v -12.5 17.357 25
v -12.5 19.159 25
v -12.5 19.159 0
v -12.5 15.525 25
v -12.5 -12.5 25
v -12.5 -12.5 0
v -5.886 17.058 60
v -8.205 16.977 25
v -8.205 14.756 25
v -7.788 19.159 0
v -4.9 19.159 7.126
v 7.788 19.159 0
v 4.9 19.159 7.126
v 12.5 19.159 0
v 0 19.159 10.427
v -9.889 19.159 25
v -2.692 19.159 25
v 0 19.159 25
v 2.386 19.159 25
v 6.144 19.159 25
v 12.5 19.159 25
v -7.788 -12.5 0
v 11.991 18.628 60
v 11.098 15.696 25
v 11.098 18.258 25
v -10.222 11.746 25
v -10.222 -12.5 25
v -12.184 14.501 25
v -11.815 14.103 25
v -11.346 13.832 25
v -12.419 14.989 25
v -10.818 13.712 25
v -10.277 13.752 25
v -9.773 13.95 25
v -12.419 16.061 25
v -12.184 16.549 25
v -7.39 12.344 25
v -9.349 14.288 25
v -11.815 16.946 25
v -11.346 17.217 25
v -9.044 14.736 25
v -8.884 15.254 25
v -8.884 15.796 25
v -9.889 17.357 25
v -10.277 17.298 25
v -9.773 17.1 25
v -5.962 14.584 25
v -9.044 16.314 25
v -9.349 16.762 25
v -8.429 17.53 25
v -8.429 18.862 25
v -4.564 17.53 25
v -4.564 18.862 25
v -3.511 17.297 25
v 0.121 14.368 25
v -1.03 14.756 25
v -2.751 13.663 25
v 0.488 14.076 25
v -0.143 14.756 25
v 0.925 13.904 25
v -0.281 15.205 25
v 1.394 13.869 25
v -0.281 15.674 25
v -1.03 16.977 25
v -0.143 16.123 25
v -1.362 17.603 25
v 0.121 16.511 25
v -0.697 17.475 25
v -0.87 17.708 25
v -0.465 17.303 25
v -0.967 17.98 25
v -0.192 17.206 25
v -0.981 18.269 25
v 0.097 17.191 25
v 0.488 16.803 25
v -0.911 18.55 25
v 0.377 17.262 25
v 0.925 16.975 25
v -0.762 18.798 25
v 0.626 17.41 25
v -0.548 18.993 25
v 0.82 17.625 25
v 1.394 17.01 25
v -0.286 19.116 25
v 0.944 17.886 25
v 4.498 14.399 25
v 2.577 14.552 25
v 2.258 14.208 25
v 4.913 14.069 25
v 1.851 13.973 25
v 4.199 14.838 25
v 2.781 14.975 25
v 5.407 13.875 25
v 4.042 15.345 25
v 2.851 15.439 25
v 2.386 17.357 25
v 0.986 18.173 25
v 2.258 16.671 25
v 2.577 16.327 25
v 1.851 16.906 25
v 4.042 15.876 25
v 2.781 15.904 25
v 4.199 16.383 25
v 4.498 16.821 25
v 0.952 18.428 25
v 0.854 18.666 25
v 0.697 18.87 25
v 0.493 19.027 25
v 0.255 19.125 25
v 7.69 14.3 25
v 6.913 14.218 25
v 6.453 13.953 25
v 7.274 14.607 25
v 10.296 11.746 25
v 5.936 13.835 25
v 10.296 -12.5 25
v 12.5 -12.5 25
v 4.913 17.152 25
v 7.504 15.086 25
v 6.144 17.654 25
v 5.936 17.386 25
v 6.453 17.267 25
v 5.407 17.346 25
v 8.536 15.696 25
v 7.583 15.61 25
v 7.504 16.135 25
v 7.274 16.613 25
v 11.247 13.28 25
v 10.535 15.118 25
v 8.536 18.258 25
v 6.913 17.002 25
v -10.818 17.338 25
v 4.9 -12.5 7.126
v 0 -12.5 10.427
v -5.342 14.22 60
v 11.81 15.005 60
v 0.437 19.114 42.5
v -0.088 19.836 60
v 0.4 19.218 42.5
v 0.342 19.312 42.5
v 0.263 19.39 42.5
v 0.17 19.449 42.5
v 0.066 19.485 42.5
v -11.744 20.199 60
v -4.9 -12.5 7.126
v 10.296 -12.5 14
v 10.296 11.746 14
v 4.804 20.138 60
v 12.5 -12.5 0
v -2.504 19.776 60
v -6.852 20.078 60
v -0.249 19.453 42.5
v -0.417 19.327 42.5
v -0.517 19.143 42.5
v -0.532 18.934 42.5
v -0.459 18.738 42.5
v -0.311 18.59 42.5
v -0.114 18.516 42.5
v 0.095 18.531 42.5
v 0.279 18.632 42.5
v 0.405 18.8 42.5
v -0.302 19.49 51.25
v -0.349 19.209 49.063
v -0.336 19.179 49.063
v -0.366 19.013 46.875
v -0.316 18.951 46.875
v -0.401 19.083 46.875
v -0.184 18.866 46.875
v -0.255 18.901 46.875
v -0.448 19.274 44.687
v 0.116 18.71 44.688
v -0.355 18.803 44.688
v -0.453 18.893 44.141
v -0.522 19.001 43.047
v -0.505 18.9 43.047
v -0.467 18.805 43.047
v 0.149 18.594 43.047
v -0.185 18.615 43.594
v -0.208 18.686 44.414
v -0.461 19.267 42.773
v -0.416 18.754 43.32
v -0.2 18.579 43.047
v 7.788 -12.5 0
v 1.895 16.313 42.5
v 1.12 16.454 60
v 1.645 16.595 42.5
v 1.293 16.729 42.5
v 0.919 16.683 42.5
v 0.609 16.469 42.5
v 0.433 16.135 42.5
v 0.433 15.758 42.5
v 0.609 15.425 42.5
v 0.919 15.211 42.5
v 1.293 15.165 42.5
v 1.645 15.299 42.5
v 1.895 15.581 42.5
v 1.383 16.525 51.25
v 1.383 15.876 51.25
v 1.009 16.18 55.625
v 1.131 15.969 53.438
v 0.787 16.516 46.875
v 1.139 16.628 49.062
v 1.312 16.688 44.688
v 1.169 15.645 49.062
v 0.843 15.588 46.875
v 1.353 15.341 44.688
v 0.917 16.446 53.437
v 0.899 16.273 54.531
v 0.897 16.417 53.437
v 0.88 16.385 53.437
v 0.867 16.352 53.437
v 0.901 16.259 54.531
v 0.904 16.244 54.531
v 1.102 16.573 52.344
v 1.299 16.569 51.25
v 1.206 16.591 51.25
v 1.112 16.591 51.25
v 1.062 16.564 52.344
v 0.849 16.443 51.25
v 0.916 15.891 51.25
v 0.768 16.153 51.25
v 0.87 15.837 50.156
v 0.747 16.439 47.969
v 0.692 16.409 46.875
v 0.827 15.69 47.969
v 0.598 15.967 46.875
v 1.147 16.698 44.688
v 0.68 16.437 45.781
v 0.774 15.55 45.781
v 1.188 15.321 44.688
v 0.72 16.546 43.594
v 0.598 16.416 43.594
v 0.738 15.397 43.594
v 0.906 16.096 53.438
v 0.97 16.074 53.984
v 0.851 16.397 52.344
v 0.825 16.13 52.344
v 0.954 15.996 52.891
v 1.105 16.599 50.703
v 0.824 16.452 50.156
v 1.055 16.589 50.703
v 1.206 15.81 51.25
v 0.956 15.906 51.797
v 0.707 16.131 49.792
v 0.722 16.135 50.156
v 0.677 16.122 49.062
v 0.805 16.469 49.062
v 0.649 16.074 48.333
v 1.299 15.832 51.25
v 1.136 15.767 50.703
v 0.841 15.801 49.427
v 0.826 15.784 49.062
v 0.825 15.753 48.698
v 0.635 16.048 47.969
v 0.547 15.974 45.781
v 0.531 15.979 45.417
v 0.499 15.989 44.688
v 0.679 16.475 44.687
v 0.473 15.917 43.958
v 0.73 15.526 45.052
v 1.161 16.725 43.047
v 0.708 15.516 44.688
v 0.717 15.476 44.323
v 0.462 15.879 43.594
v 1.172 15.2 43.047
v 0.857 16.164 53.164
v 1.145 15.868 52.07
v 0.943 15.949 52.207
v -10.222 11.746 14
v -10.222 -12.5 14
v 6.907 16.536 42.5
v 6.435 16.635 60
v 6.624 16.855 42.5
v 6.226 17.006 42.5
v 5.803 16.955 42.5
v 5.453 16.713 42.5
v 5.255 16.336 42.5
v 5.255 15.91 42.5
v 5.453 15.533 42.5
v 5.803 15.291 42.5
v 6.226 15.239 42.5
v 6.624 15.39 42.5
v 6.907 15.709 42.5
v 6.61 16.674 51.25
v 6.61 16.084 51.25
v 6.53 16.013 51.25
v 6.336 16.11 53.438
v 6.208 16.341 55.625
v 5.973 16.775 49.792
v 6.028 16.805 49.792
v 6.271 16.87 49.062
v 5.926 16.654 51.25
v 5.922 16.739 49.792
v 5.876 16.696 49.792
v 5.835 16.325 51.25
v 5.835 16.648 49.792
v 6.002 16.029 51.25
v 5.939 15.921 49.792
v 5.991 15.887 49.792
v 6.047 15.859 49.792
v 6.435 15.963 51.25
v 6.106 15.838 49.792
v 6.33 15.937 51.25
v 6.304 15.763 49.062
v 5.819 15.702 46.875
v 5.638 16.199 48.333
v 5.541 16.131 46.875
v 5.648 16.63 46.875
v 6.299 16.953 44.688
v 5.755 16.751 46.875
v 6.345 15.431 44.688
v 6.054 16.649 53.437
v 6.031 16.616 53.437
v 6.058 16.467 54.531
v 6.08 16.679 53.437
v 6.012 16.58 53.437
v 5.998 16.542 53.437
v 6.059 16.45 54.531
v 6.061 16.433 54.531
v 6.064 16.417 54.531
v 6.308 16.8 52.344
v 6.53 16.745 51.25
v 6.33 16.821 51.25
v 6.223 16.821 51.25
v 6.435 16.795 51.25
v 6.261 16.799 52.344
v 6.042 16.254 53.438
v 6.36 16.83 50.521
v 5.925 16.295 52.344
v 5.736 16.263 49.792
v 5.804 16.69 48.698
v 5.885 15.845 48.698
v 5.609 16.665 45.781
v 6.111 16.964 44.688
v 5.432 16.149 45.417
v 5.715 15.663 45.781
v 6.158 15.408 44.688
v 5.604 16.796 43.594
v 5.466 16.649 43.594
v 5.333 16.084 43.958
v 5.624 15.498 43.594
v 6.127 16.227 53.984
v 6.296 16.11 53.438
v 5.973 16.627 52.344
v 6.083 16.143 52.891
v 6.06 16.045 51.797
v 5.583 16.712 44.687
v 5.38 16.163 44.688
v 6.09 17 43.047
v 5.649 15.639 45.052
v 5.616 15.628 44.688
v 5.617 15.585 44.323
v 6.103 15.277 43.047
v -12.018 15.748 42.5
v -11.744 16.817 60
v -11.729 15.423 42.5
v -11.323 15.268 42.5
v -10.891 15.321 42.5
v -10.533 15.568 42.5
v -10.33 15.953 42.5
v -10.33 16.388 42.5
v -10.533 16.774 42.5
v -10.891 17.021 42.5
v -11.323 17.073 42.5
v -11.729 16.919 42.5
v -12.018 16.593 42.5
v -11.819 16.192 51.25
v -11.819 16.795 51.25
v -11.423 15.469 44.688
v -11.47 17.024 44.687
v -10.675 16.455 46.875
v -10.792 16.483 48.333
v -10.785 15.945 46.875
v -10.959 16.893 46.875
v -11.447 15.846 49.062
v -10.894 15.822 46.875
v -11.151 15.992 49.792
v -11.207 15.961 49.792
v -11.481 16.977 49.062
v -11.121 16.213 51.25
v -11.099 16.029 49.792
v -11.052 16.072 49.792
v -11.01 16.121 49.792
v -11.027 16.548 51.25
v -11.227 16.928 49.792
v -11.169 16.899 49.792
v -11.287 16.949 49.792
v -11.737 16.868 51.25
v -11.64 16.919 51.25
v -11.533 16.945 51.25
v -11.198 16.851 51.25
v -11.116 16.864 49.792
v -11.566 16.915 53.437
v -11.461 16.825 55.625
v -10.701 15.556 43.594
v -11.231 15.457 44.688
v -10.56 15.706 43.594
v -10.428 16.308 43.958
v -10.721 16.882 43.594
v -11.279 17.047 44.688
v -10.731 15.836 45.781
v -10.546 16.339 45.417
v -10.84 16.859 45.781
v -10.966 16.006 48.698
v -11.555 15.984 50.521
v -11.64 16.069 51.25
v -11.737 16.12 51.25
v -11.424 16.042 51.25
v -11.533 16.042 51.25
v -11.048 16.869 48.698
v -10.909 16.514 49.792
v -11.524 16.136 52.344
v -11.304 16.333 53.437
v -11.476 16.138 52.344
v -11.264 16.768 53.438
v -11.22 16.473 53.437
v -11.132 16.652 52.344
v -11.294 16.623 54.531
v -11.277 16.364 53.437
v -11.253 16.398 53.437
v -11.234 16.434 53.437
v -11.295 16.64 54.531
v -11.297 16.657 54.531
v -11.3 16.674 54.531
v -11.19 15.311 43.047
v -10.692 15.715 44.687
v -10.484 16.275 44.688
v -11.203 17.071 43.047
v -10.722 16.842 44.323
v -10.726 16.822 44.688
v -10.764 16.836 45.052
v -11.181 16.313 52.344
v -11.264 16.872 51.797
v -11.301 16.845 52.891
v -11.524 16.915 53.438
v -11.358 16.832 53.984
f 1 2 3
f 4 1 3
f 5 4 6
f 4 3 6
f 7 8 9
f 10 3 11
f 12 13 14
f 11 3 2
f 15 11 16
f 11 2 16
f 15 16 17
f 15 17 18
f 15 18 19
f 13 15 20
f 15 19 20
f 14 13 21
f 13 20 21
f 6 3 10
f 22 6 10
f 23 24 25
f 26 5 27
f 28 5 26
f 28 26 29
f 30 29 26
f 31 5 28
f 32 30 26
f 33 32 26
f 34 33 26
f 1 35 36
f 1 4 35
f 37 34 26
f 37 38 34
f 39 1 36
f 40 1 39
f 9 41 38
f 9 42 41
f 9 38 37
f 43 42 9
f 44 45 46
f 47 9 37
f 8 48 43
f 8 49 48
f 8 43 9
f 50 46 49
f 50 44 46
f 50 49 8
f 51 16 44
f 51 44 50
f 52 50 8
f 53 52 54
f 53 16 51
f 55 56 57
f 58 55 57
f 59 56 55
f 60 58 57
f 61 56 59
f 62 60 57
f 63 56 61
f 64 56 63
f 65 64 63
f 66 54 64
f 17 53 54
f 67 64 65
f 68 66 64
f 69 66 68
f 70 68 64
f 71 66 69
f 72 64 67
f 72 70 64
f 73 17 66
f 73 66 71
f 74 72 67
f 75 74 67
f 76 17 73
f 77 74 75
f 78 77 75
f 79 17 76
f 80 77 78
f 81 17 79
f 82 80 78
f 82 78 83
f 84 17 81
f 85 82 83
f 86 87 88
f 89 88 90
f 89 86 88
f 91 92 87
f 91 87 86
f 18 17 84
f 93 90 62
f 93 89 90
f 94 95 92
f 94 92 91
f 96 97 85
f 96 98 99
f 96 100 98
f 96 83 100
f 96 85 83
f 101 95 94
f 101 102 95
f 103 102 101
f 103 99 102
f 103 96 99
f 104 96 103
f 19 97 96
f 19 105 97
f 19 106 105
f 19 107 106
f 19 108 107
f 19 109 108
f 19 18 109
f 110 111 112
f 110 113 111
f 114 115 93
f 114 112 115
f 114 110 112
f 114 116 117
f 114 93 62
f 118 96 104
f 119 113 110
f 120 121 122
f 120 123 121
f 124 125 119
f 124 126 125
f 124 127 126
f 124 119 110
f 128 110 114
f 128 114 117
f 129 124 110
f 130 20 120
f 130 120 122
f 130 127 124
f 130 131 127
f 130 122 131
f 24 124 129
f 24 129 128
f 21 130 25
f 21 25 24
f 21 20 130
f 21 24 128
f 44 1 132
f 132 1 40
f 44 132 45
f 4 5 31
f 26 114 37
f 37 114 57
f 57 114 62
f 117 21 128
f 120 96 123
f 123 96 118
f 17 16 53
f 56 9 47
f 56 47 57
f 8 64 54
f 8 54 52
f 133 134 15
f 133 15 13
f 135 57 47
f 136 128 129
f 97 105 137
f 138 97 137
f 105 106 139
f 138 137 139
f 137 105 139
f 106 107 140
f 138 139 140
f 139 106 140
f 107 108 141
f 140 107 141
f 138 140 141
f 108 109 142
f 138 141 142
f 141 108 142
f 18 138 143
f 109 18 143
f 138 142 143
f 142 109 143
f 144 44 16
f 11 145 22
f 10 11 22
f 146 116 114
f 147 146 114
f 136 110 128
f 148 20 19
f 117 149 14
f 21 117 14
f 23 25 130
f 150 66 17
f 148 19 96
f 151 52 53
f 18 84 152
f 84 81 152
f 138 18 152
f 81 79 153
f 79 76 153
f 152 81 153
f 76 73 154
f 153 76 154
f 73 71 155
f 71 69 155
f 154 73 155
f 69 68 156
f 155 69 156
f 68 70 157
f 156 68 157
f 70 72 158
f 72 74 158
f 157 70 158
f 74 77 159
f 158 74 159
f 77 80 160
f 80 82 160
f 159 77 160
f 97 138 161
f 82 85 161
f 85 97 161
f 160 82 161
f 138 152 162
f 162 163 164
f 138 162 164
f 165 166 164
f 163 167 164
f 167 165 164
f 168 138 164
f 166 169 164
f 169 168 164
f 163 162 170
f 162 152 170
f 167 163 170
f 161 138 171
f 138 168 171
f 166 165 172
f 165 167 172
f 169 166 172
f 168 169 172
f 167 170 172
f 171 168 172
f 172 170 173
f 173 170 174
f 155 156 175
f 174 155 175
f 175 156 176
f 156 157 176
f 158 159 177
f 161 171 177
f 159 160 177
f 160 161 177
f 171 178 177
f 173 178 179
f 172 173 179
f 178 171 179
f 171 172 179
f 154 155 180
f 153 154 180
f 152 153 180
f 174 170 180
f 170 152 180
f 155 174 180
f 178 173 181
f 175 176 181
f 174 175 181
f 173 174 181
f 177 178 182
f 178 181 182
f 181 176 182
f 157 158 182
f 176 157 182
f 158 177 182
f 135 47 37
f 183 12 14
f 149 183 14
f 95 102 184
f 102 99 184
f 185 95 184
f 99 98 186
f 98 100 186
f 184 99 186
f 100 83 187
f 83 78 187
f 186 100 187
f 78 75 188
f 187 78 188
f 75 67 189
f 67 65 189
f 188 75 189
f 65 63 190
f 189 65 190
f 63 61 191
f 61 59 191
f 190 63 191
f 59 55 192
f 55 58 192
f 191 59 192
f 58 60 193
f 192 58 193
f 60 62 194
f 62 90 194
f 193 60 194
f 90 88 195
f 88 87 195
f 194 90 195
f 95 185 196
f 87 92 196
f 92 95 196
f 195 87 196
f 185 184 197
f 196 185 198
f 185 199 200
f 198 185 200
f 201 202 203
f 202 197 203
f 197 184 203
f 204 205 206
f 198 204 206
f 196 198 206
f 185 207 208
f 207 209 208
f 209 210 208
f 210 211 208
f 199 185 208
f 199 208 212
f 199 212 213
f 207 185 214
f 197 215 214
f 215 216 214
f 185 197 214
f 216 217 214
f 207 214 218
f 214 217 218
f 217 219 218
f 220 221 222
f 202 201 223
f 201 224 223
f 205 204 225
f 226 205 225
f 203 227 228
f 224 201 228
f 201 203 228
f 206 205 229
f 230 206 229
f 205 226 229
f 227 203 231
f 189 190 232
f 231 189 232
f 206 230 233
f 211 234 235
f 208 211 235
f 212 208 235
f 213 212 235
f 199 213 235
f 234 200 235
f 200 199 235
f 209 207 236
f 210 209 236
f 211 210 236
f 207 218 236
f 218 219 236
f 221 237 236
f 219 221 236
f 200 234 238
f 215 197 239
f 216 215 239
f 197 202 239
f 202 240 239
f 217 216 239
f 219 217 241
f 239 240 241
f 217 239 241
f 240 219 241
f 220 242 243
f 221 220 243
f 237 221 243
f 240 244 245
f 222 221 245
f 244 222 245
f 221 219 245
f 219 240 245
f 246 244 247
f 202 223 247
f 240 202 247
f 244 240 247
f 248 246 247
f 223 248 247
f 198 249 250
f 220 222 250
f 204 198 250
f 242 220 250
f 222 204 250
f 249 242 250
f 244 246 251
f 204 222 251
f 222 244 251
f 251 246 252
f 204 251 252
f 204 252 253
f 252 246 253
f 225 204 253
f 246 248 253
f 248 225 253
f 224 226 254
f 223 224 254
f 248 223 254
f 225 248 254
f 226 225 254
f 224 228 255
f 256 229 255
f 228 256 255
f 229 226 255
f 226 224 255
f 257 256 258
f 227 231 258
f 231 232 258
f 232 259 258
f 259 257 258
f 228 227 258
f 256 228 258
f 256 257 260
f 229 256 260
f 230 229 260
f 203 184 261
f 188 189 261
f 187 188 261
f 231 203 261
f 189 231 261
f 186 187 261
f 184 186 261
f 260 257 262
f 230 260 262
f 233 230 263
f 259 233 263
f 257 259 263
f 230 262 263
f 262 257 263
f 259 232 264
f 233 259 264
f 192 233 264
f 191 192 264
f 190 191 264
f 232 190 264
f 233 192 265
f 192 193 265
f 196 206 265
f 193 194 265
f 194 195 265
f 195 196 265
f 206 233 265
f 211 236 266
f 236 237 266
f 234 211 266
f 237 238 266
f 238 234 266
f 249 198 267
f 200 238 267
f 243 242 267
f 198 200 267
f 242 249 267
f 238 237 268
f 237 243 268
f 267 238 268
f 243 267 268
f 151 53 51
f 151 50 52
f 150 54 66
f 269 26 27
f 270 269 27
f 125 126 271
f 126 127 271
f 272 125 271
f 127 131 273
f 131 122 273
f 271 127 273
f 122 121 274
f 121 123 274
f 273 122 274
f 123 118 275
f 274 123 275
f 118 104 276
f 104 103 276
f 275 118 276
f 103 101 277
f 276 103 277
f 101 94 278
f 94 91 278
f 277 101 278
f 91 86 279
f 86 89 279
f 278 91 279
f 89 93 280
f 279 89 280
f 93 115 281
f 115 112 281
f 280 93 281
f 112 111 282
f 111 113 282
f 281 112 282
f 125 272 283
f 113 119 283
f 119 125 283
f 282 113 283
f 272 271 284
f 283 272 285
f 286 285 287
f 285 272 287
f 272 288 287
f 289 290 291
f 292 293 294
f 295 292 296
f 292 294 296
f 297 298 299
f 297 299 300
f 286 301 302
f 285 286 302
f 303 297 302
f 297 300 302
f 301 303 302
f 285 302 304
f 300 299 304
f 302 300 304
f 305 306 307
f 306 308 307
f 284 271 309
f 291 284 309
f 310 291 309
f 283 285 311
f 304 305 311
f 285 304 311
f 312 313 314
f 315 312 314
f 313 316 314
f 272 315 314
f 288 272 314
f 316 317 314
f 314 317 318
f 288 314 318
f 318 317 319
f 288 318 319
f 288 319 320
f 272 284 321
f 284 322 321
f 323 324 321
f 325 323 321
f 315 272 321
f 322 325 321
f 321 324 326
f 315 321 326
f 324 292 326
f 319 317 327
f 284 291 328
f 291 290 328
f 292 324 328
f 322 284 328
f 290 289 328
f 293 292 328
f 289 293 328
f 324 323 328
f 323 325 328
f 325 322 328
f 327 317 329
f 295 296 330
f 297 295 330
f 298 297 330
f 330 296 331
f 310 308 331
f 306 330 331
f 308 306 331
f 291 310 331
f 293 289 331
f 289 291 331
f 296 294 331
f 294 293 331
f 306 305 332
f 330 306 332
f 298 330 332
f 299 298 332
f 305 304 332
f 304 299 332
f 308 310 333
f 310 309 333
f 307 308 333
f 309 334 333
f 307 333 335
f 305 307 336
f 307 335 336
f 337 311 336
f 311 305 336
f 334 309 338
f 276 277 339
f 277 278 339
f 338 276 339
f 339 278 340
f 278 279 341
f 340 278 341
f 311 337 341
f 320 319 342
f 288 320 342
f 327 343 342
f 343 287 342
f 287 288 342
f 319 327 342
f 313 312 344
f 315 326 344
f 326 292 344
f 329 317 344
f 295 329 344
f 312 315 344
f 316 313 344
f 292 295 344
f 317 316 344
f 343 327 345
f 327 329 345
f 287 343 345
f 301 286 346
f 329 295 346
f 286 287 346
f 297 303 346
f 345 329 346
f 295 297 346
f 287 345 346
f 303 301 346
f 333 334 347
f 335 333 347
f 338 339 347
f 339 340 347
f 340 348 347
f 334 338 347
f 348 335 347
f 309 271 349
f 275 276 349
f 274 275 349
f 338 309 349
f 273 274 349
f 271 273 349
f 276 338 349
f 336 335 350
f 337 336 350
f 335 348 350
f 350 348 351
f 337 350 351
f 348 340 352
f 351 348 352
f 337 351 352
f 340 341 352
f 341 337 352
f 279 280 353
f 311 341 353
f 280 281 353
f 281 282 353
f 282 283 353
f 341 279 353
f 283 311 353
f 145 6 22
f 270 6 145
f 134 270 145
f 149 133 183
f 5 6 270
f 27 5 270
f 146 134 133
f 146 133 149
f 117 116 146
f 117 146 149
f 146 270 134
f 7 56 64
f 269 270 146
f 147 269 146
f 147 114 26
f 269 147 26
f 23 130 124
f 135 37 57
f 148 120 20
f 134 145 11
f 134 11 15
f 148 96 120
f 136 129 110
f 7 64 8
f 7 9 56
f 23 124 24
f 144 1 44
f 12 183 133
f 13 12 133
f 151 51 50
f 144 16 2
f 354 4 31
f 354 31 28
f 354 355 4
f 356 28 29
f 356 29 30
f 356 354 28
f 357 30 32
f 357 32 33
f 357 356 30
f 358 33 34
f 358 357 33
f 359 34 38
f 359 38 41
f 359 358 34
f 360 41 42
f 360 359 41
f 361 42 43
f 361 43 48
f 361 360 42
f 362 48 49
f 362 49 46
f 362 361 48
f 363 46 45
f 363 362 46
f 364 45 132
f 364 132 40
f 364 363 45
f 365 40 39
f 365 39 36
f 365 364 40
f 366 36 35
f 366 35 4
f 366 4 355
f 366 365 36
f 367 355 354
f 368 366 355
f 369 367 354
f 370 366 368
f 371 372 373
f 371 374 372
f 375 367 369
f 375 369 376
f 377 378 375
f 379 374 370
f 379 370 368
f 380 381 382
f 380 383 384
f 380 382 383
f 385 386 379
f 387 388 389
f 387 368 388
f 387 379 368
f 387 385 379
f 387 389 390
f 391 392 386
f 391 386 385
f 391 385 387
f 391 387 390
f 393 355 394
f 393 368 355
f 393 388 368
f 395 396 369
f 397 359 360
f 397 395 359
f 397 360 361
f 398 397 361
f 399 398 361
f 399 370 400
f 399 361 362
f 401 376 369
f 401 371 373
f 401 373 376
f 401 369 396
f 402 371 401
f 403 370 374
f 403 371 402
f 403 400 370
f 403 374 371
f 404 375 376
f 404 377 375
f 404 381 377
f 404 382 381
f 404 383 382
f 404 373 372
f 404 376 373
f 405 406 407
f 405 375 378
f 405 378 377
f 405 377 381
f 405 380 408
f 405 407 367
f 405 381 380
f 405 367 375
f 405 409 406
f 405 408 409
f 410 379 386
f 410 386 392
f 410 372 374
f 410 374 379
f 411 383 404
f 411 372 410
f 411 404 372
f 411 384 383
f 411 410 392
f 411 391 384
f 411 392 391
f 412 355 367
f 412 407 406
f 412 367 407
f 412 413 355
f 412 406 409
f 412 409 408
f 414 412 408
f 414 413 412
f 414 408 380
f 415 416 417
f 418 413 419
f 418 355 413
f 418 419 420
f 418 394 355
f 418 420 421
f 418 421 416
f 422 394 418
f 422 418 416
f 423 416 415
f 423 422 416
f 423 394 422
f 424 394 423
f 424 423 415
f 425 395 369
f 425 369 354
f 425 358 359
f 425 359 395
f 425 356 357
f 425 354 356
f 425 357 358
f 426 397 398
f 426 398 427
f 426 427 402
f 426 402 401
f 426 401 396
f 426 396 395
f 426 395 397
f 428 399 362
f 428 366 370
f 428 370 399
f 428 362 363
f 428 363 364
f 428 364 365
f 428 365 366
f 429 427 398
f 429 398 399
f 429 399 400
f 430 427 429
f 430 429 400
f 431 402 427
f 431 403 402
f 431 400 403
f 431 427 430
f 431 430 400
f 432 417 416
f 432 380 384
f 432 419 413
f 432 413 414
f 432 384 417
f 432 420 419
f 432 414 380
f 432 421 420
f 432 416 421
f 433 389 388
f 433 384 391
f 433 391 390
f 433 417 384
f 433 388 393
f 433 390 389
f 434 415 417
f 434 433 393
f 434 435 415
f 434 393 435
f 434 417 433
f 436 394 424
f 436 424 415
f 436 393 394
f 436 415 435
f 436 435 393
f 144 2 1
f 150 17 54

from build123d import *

# Parameters (mm, degrees)
F0_W         = 25
F0_H         = 25
F0_H_2       = 6.658737734
F1_DEPTH     = 25
F3_DEPTH     = 35.6
F4_W         = 2.6114728302
F4_H         = 1.8013045192
F4_W_2       = 7.1746204048
F4_H_2       = 2.2207163274
F4_W_3       = 3.8653127849
F4_H_3       = 1.3321898878
F4_R         = 1.5749223429
F4_R_2       = 1.7802160879
F4_W_4       = 2.5623645633
F4_H_4       = 2.5623627007
F20_DEPTH    = 11
F21_T1_DEPTH = 31.658737734


# Not quite as in the source:
# - a fillet or chamfer that OpenCascade refuses, or shapes differently, is made with other operations: its cross-section is extruded or revolved along the edge and cut away or added


with BuildPart() as f1:
    # F0 (on Top) → F1 (new body)
    with BuildSketch(Plane.XY):
        Rectangle(F0_W, F0_H)
        with Locations((0, 15.829368867)):
            Rectangle(F0_W, F0_H_2)
    extrude(amount=F1_DEPTH)

    # F2 (on face) → F3 (cut)
    with BuildSketch(Plane.XZ.offset(12.5)):
        Polygon((0, 11.7594422773), (0, 0), (7.7875177376, 0), (3.0218927836, 11.7594422773), align=None)
        Polygon((-3.0218927836, 11.7594422773), (-7.7875177376, 0), (0, 0), (0, 11.7594422773), align=None)
    extrude(amount=-F3_DEPTH, mode=Mode.SUBTRACT)

    # F4 (on face) → F7 section 0
    with BuildSketch(Plane.XY.offset(25), mode=Mode.PRIVATE) as f7_s0:
        with BuildLine():
            ThreePointArc((-8.8635824621, 15.5248958617), (-10.681791231, 17.3431046307), (-12.5, 15.5248958617))
            ThreePointArc((-12.5, 15.5248958617), (-10.681791231, 13.7066870928), (-8.8635824621, 15.5248958617))
        make_face()
    loft([f7_s0.sketch, Vertex(-11.7442617193, 16.8165676296, 60)])

    # F4 (on face) → F8 section 0
    with BuildSketch(Plane.XY.offset(25), mode=Mode.PRIVATE) as f8_s0:
        with Locations((-11.1942635849, 18.2580854744)):
            Rectangle(F4_W, F4_H)
    loft([f8_s0.sketch, Vertex(-11.7442617193, 20.1987158507, 60)])

    # F4 (on face) → F9 section 0
    with BuildSketch(Plane.XY.offset(25), mode=Mode.PRIVATE) as f9_s0:
        Polygon((11.2469336018, 13.2797770202), (10.5349393561, 15.1175186038), (7.6900690421, 14.3002654268), align=None)
    loft([Vertex(11.8099879473, 15.0047028437, 60), f9_s0.sketch])

    # F4 (on face) → F10 section 0
    with BuildSketch(Plane.XY.offset(25), mode=Mode.PRIVATE) as f10_s0:
        with Locations((-4.6175280586, 15.8665440977)):
            Rectangle(F4_W_2, F4_H_2)
    loft([f10_s0.sketch, Vertex(-5.8858972043, 17.0581489801, 60)])

    # F4 (on face) → F11 section 0
    with BuildSketch(Plane.XY.offset(25), mode=Mode.PRIVATE) as f11_s0:
        Polygon((-5.9617283097, 14.5839094924), (-7.3897121474, 12.3443854973), (-2.7514786925, 13.6628672481), align=None)
    loft([Vertex(-5.3423377685, 14.2195606604, 60), f11_s0.sketch])

    # F4 (on face) → F12 section 0
    with BuildSketch(Plane.XY.offset(25), mode=Mode.PRIVATE) as f12_s0:
        with Locations((-6.4965952188, 18.1957688183)):
            Rectangle(F4_W_3, F4_H_3)
    loft([f12_s0.sketch, Vertex(-6.8522254005, 20.0779251754, 60)])

    # F4 (on face) → F13 section 0
    with BuildSketch(Plane.XY.offset(25), mode=Mode.PRIVATE) as f13_s0:
        Polygon((-1.36240758, 17.6026448607), (-2.6916782372, 19.158737734), (-3.5105766729, 17.2970890999), align=None)
    loft([f13_s0.sketch, Vertex(-2.5037485175, 19.7759475559, 60)])

    # F4 (on face) → F14 section 0
    with BuildSketch(Plane.XY.offset(25), mode=Mode.PRIVATE) as f14_s0:
        with Locations((1.2759102974, 15.4394833371)):
            Circle(F4_R)
    loft([Vertex(1.1199823348, 16.4541937411, 60), f14_s0.sketch])

    # F4 (on face) → F15 section 0
    with BuildSketch(Plane.XY.offset(25), mode=Mode.PRIVATE) as f15_s0:
        with BuildLine():
            ThreePointArc((0.9860657156, 18.1726720184), (0.6972537523, 18.8699257744), (-5.2e-09, 19.158737734))
            ThreePointArc((-5.2e-09, 19.158737734), (-0.6972537523, 17.4754182624), (0.9860657156, 18.1726720184))
        make_face()
    loft([Vertex(-0.0879280269, 19.8363438249, 60), f15_s0.sketch])

    # F4 (on face) → F16 section 0
    with BuildSketch(Plane.XY.offset(25), mode=Mode.PRIVATE) as f16_s0:
        Polygon((6.14440348, 19.158737734), (2.386267297, 19.158737734), (2.386267297, 17.3574332148), (6.14440348, 17.6535397768), align=None)
    loft([Vertex(4.8041078262, 20.1383195817, 60), f16_s0.sketch])

    # F4 (on face) → F17 section 0
    with BuildSketch(Plane.XY.offset(25), mode=Mode.PRIVATE) as f17_s0:
        with Locations((5.8027543128, 15.6103083864)):
            Circle(F4_R_2)
    loft([Vertex(6.4347875305, 16.6353806853, 60), f17_s0.sketch])

    # F4 (on face) → F18 section 0
    with BuildSketch(Plane.XY.offset(25), mode=Mode.PRIVATE) as f18_s0:
        with Locations((9.8171252757, 16.9769022614)):
            Rectangle(F4_W_4, F4_H_4)
    loft([f18_s0.sketch, Vertex(11.9911748916, 18.6284333467, 60)])

    # F19 (on face) → F20 (cut)
    with BuildSketch(Plane.XY.offset(25)):
        Polygon((10.2956090122, -14.3586313352), (10.2956090122, -12.4287493527), (10.2956090122, 11.7455618456), (-10.2220848203, 11.7455618456), (-10.2220848203, -12.3271765187), (-10.2220848203, -14.3586313352), align=None)
    extrude(amount=-F20_DEPTH, mode=Mode.SUBTRACT)

    # F21: chamfer of 5 on 2 edges, made by hand

    # F21_s2 → F21_t1 (join)
    with BuildSketch(Plane.XZ.offset(-19.158737734)):
        Polygon((-4.8998373819, 7.1255104601), (1.9781072164, 11.7594422773), (-3.0218927836, 11.7594422773), align=None)
        Polygon((-1.9781072164, 11.7594422773), (4.8998373819, 7.1255104601), (3.0218927836, 11.7594422773), align=None)
    extrude(amount=F21_T1_DEPTH)


solid = f1.part
